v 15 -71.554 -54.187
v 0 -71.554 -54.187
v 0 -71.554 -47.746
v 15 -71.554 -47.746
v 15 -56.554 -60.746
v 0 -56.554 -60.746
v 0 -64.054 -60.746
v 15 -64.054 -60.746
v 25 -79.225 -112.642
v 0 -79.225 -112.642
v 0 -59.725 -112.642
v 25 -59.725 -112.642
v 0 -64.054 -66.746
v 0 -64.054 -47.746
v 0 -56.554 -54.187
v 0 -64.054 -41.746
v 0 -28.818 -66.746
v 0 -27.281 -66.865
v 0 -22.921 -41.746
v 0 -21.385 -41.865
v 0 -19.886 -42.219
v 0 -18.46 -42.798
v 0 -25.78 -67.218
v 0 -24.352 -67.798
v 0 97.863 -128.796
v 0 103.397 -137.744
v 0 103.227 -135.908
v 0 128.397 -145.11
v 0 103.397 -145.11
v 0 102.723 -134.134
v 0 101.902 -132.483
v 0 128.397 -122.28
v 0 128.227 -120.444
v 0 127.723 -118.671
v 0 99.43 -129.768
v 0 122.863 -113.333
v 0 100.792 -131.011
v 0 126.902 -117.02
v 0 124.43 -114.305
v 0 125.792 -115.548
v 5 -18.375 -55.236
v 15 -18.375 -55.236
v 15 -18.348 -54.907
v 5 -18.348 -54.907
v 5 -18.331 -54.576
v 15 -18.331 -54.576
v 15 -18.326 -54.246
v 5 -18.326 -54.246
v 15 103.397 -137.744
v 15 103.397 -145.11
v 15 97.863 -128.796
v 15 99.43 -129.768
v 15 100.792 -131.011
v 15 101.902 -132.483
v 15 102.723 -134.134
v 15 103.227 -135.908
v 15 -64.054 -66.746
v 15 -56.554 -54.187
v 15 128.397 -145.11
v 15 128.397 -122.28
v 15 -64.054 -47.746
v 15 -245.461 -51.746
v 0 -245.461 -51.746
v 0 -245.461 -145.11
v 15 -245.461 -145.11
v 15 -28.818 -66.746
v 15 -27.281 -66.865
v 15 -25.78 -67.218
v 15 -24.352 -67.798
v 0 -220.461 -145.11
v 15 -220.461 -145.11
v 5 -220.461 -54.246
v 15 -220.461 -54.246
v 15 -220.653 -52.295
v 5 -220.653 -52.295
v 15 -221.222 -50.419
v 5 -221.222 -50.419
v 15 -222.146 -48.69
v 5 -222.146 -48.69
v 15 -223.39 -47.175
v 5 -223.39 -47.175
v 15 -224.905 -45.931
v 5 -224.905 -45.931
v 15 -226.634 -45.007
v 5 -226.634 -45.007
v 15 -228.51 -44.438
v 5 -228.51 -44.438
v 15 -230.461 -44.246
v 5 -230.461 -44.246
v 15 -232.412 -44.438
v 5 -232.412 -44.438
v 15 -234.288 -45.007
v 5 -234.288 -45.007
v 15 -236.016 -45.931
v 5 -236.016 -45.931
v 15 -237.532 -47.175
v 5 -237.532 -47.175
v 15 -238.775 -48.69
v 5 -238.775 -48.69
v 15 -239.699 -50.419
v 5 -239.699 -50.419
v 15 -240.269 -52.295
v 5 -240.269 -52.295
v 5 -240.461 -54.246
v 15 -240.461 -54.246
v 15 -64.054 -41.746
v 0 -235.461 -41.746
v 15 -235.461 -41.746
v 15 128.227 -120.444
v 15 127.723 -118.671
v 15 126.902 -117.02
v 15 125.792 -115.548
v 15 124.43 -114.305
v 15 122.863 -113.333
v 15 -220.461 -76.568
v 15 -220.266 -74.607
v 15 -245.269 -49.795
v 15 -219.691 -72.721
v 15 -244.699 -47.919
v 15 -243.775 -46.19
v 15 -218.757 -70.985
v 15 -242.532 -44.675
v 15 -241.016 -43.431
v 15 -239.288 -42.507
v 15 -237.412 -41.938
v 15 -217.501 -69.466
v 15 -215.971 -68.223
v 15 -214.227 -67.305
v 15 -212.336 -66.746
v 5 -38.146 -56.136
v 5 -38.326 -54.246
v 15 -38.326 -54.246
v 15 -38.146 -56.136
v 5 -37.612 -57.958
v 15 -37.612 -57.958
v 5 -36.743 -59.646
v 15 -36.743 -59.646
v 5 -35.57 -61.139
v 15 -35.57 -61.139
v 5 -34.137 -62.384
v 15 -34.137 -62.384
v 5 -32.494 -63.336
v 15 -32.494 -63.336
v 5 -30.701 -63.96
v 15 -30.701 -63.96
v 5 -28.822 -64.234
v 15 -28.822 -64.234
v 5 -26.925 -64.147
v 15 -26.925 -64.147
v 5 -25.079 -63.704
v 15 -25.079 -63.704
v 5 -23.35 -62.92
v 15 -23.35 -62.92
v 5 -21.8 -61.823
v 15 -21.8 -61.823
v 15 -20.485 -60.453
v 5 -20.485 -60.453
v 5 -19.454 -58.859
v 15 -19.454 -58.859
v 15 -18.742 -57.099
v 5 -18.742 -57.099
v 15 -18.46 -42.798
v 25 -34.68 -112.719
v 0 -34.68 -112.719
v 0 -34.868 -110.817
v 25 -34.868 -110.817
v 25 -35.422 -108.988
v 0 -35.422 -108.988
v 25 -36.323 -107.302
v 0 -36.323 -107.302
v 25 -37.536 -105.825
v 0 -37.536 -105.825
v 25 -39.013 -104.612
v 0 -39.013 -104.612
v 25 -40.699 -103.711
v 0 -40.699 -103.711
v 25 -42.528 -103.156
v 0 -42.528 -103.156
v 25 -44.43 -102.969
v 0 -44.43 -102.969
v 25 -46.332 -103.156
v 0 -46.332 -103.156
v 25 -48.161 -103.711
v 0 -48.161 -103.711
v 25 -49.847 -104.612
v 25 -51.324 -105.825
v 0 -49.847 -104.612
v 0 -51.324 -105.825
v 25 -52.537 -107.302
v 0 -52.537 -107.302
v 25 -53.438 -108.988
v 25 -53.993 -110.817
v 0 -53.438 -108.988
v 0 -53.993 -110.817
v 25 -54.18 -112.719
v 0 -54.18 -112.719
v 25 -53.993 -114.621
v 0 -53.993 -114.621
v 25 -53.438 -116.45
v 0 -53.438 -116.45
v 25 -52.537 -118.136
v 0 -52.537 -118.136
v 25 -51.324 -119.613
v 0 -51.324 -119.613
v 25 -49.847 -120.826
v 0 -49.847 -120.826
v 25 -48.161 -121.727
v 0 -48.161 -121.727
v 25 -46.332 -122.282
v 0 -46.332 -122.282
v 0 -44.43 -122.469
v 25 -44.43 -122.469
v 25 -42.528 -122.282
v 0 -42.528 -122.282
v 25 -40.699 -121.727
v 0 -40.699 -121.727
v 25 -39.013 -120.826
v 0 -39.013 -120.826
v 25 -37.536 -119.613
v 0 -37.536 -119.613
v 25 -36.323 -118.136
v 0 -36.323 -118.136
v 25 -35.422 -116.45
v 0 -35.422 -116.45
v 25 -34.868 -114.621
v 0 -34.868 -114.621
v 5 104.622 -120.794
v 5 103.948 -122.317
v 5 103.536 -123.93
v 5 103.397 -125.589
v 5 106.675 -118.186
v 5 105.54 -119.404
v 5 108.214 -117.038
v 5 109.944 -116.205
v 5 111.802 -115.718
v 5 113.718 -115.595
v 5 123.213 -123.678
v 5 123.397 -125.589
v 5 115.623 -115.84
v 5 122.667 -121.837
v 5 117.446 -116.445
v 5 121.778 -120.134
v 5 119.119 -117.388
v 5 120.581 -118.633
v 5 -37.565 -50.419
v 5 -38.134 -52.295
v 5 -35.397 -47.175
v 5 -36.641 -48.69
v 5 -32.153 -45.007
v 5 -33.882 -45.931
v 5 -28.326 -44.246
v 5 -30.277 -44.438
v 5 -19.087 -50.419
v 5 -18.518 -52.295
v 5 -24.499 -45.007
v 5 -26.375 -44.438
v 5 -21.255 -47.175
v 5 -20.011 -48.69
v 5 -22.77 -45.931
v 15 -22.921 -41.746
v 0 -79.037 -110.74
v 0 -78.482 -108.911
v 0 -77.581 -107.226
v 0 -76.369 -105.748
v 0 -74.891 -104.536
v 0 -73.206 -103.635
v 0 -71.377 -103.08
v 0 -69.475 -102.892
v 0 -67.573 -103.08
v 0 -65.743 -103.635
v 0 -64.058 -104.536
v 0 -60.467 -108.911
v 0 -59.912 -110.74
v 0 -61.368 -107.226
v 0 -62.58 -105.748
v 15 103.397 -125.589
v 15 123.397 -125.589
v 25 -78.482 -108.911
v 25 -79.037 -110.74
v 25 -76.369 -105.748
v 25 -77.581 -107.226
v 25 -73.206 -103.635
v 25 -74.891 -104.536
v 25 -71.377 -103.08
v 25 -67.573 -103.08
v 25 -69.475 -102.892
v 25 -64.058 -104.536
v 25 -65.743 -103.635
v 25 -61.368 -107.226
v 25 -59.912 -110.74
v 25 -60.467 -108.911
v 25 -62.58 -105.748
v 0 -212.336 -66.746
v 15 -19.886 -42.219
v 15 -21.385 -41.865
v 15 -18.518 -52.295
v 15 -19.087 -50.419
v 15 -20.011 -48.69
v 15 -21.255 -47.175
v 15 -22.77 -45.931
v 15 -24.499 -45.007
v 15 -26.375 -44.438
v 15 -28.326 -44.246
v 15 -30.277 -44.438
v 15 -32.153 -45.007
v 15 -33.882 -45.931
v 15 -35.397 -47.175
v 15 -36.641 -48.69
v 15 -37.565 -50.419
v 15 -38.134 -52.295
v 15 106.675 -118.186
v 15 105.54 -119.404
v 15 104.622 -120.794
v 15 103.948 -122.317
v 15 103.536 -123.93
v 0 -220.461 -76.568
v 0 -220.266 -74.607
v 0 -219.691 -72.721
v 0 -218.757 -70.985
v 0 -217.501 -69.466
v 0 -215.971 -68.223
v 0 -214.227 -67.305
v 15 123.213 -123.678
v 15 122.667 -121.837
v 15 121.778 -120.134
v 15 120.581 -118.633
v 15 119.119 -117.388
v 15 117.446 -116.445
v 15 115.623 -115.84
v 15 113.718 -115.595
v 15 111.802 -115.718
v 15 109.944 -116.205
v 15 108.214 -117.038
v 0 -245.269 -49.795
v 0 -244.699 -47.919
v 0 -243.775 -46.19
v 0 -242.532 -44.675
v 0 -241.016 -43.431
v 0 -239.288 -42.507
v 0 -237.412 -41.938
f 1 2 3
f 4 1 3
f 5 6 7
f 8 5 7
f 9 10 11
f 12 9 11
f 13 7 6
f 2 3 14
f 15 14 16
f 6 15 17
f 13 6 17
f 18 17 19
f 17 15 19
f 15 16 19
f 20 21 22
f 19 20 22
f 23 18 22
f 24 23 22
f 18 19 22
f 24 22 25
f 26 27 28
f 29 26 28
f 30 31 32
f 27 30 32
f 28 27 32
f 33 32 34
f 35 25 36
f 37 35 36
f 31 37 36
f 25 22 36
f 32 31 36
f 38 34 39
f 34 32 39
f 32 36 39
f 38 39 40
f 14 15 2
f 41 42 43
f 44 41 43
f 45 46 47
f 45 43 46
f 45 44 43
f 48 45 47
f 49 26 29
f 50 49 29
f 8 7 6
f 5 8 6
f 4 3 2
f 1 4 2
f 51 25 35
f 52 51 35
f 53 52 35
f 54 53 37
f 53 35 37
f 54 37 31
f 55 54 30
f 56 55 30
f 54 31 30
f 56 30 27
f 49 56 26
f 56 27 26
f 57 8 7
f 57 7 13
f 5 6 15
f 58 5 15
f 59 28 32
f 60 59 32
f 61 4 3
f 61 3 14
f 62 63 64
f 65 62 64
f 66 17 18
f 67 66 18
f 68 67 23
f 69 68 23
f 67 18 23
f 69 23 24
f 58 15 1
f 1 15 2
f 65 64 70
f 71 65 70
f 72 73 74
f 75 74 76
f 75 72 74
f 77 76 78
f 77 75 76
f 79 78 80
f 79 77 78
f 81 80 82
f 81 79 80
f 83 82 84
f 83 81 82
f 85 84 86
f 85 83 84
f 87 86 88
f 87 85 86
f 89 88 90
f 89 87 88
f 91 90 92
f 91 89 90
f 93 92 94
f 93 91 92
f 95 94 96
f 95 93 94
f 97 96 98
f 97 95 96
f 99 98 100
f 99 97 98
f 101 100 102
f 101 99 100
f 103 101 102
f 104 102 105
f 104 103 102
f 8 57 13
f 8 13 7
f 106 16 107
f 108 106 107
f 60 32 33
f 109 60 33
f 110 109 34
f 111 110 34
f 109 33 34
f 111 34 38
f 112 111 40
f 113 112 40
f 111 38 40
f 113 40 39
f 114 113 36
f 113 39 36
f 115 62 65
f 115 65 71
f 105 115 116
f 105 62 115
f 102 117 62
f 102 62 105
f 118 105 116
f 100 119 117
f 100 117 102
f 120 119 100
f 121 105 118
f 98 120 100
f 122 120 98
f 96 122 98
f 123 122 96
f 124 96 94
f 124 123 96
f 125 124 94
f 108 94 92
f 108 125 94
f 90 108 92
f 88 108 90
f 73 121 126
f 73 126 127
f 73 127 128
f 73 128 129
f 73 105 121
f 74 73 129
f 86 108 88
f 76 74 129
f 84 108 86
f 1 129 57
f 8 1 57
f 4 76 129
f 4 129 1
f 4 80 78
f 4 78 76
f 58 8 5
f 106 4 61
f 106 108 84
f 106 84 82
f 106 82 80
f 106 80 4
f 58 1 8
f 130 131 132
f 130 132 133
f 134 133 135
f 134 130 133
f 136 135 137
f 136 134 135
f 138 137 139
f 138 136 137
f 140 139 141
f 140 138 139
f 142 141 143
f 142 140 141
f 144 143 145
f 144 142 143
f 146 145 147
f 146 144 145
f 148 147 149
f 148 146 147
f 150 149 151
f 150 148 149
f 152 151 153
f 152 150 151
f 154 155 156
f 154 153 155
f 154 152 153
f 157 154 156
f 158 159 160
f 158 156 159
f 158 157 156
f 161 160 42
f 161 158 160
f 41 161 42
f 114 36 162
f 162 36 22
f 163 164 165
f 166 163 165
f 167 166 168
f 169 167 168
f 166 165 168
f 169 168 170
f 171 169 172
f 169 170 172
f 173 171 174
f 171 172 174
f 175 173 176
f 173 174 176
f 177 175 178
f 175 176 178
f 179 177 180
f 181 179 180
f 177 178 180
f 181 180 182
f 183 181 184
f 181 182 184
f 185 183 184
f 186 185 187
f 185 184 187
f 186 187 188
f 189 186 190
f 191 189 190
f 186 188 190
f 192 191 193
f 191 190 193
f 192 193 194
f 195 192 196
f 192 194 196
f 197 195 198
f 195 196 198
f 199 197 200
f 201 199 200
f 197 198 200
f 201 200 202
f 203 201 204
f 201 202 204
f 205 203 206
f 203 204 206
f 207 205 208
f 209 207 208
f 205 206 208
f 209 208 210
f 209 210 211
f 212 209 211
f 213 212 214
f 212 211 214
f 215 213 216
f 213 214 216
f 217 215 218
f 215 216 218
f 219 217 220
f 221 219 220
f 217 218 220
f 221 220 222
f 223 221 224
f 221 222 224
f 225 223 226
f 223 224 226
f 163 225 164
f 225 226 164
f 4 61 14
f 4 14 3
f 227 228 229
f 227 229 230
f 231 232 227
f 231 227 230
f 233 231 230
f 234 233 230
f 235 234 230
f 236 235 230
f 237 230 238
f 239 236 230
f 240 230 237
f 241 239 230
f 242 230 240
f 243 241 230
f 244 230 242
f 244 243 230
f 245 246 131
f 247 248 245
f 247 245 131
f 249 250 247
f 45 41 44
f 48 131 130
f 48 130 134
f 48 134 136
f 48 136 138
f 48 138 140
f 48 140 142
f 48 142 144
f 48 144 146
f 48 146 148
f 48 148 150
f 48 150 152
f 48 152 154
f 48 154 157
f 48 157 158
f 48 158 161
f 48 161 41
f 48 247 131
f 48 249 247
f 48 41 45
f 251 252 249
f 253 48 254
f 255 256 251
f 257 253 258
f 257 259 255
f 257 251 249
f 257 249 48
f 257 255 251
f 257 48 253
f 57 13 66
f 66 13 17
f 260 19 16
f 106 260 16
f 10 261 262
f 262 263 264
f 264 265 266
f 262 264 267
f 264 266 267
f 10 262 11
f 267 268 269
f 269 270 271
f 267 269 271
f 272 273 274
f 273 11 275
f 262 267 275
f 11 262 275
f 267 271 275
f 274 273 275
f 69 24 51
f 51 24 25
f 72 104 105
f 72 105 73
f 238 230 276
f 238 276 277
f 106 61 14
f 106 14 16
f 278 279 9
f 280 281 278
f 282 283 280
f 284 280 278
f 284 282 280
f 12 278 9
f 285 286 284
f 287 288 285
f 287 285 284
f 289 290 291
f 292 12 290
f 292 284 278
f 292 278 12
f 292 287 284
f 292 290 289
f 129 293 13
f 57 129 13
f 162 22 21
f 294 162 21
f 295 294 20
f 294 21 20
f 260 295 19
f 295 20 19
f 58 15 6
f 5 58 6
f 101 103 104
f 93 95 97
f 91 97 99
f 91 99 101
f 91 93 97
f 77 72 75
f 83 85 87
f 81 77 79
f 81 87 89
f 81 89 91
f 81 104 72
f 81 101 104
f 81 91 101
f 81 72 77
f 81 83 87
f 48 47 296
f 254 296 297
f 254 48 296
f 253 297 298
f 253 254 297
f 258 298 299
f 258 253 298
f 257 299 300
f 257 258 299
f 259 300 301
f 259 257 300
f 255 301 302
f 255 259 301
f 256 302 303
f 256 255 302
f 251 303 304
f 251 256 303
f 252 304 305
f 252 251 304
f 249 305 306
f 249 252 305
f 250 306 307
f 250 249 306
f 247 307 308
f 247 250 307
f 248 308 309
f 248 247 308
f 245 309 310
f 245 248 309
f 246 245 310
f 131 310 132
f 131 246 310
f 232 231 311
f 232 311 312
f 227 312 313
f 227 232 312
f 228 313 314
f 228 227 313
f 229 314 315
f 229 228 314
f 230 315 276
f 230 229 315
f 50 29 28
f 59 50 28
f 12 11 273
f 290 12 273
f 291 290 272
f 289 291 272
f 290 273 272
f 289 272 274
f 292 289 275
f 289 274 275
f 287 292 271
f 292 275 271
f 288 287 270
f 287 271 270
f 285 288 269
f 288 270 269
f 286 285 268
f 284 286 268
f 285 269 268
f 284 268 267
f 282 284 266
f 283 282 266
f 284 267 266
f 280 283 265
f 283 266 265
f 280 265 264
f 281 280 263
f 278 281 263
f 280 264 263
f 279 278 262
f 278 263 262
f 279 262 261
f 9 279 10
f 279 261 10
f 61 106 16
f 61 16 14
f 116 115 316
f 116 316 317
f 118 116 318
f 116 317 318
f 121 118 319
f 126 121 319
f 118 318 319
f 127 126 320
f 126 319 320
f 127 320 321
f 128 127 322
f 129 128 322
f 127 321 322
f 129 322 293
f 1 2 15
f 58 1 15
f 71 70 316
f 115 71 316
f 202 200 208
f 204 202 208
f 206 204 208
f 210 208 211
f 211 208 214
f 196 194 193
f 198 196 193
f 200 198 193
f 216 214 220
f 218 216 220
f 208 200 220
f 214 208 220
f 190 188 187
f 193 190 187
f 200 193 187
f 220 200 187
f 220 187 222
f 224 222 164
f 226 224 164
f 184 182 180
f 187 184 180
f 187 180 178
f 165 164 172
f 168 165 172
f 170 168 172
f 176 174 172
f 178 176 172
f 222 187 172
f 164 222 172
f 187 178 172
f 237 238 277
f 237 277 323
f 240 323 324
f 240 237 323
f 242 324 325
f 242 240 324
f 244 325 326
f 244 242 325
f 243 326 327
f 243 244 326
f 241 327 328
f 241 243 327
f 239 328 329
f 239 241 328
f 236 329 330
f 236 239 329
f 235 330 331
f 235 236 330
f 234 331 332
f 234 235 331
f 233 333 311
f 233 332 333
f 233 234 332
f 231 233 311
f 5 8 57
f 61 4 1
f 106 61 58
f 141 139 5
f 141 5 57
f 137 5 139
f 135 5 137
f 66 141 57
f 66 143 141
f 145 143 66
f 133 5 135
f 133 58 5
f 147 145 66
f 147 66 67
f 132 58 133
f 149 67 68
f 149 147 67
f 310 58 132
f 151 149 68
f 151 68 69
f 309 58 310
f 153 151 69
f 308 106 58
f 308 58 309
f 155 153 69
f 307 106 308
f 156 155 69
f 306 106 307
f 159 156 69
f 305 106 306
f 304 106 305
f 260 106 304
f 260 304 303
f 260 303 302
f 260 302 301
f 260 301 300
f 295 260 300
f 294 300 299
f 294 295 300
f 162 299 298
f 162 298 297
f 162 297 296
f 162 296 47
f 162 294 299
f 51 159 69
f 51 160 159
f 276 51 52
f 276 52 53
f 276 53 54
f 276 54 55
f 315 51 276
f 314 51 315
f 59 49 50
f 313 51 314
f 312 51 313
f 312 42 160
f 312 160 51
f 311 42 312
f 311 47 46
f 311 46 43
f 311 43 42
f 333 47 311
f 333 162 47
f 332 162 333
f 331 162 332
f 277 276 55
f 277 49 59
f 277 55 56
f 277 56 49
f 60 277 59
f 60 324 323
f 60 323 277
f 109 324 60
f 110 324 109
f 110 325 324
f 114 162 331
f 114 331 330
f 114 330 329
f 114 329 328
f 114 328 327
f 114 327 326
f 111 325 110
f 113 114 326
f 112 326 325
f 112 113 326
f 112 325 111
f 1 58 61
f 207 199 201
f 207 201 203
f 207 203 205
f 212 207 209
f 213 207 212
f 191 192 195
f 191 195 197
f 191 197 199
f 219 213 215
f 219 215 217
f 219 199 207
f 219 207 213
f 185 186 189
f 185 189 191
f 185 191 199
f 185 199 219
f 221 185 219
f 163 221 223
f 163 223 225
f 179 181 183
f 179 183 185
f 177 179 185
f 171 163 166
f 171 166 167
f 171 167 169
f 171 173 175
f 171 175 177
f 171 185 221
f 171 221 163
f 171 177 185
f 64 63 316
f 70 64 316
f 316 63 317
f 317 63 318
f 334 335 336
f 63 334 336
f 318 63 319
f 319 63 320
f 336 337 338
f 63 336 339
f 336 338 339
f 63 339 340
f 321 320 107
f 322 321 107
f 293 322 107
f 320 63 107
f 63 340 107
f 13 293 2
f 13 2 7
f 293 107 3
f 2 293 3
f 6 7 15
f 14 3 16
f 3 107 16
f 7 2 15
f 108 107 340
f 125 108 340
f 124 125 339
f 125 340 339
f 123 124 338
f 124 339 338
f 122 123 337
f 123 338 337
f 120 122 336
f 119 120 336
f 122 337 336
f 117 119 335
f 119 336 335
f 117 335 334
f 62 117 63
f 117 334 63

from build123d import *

# Parameters (mm, degrees)
F3_DEPTH  = 15
F4_DEPTH  = 25
F5_DEPTH  = 15
F6_DEPTH  = 25
F7_DEPTH  = 25
F8_R      = 9.75
F9_DEPTH  = 25
F10_DEPTH = 5
F11_DEPTH = 5
F12_DEPTH = 5


with BuildPart() as f3:
    # F2 (on Right) → F3 (new body)
    with BuildSketch(Plane.YZ):
        with BuildLine():
            Line((-64.0537443757, -47.7458898533), (-64.0537443757, -41.7458898533))
            Line((-64.0537443757, -41.7458898533), (-235.4606981414, -41.7458898533))
            ThreePointArc((-235.4606981414, -41.7458898533), (-242.5317659533, -44.6748220415), (-245.4606981414, -51.7458898533))
            Line((-245.4606981414, -51.7458898533), (-245.4606981414, -145.1103440631))
            Line((-245.4606981414, -145.1103440631), (-220.4606981414, -145.1103440631))
            Line((-220.4606981414, -145.1103440631), (-220.4606981414, -76.5684022923))
            ThreePointArc((-220.4606981414, -76.5684022923), (-218.1664426563, -70.1949023534), (-212.336397847, -66.7458898533))
            Line((-212.336397847, -66.7458898533), (-64.0537443757, -66.7458898533))
            Line((-64.0537443757, -66.7458898533), (-64.0537443757, -60.7458898533))
            Line((-64.0537443757, -60.7458898533), (-56.5537443757, -60.7458898533))
            Line((-56.5537443757, -60.7458898533), (-56.5537443757, -54.18692423))
            Line((-56.5537443757, -54.18692423), (-71.5537443757, -54.18692423))
            Line((-71.5537443757, -54.18692423), (-71.5537443757, -47.7458898533))
            Line((-71.5537443757, -47.7458898533), (-64.0537443757, -47.7458898533))
        make_face()
    extrude(amount=F3_DEPTH)

    # F1 (on Right) → F4 (cut)
    with BuildSketch(Plane.YZ):
        with BuildLine():
            Line((-230.4606981414, -54.2458898533), (-220.4606981414, -54.2458898533))
            ThreePointArc((-220.4606981414, -54.2458898533), (-230.4606981414, -44.2458898533), (-240.4606981414, -54.2458898533))
            Line((-240.4606981414, -54.2458898533), (-230.4606981414, -54.2458898533))
        make_face()
    extrude(amount=F4_DEPTH, mode=Mode.SUBTRACT)

    # F1 (on Right) → F10 (join)
    with BuildSketch(Plane.YZ):
        with BuildLine():
            Line((-230.4606981414, -54.2458898533), (-220.4606981414, -54.2458898533))
            ThreePointArc((-220.4606981414, -54.2458898533), (-230.4606981414, -44.2458898533), (-240.4606981414, -54.2458898533))
            Line((-240.4606981414, -54.2458898533), (-230.4606981414, -54.2458898533))
        make_face()
    extrude(amount=F10_DEPTH)


with BuildPart() as f5:
    # F2 (on Right) → F5 (new body)
    with BuildSketch(Plane.YZ):
        with BuildLine():
            Line((103.3974266851, -145.1103440631), (128.3974266851, -145.1103440631))
            Line((128.3974266851, -145.1103440631), (128.3974266851, -122.2802950504))
            ThreePointArc((128.3974266851, -122.2802950504), (126.9020431462, -117.0199244505), (122.8631269154, -113.3328081712))
            Line((122.8631269154, -113.3328081712), (-18.4597660903, -42.7984017651))
            ThreePointArc((-18.4597660903, -42.7984017651), (-20.6290450089, -42.0131372779), (-22.9205489159, -41.7458898533))
            Line((-22.9205489159, -41.7458898533), (-64.0537443757, -41.7458898533))
            Line((-64.0537443757, -41.7458898533), (-64.0537443757, -47.7458898533))
            Line((-64.0537443757, -47.7458898533), (-71.5537443757, -47.7458898533))
            Line((-71.5537443757, -47.7458898533), (-71.5537443757, -54.18692423))
            Line((-71.5537443757, -54.18692423), (-56.5537443757, -54.18692423))
            Line((-56.5537443757, -54.18692423), (-56.5537443757, -60.7458898533))
            Line((-56.5537443757, -60.7458898533), (-64.0537443757, -60.7458898533))
            Line((-64.0537443757, -60.7458898533), (-64.0537443757, -66.7458898533))
            Line((-64.0537443757, -66.7458898533), (-28.8176704198, -66.7458898533))
            ThreePointArc((-28.8176704198, -66.7458898533), (-26.5236421715, -67.0125741595), (-24.3519701895, -67.7984029742))
            Line((-24.3519701895, -67.7984029742), (97.8631269154, -128.7960880966))
            ThreePointArc((97.8631269154, -128.7960880966), (101.9020431462, -132.4832043759), (103.3974266851, -137.7435749758))
            Line((103.3974266851, -137.7435749758), (103.3974266851, -145.1103440631))
        make_face()
    extrude(amount=F5_DEPTH)

    # F1 (on Right) → F6 (cut)
    with BuildSketch(Plane.YZ):
        with BuildLine():
            Line((-28.3260242226, -54.2458898533), (-18.3260242226, -54.2458898533))
            ThreePointArc((-18.3260242226, -54.2458898533), (-28.3260242226, -44.2458898533), (-38.3260242226, -54.2458898533))
            Line((-38.3260242226, -54.2458898533), (-28.3260242226, -54.2458898533))
        make_face()
    extrude(amount=F6_DEPTH, mode=Mode.SUBTRACT)

    # F1 (on Right) → F7 (cut)
    with BuildSketch(Plane.YZ):
        with BuildLine():
            ThreePointArc((123.3974266851, -125.5894405546), (117.4455848239, -116.4454580698), (106.6749435485, -118.1861831311))
            ThreePointArc((106.6749435485, -118.1861831311), (104.2534442002, -121.5412824158), (103.3974266851, -125.5894405546))
            Line((103.3974266851, -125.5894405546), (113.3974266851, -125.5894405546))
            Line((113.3974266851, -125.5894405546), (123.3974266851, -125.5894405546))
        make_face()
        with BuildLine():
            ThreePointArc((-18.3751599266, -55.2359907384), (-18.3383157026, -54.741549535), (-18.3260242226, -54.2458898533))
            Line((-18.3260242226, -54.2458898533), (-28.3260242226, -54.2458898533))
            Line((-28.3260242226, -54.2458898533), (-38.3260242226, -54.2458898533))
            ThreePointArc((-38.3260242226, -54.2458898533), (-28.8216839042, -64.2335983733), (-18.3751599266, -55.2359907384))
        make_face()
    extrude(amount=F7_DEPTH, mode=Mode.SUBTRACT)

    # F1 (on Right) → F11 (join)
    with BuildSketch(Plane.YZ):
        with BuildLine():
            Line((-28.3260242226, -54.2458898533), (-18.3260242226, -54.2458898533))
            ThreePointArc((-18.3260242226, -54.2458898533), (-28.3260242226, -44.2458898533), (-38.3260242226, -54.2458898533))
            Line((-38.3260242226, -54.2458898533), (-28.3260242226, -54.2458898533))
        make_face()
        with BuildLine():
            ThreePointArc((123.3974266851, -125.5894405546), (117.4455848239, -116.4454580698), (106.6749435485, -118.1861831311))
            ThreePointArc((106.6749435485, -118.1861831311), (104.2534442002, -121.5412824158), (103.3974266851, -125.5894405546))
            Line((103.3974266851, -125.5894405546), (113.3974266851, -125.5894405546))
            Line((113.3974266851, -125.5894405546), (123.3974266851, -125.5894405546))
        make_face()
    extrude(amount=F11_DEPTH)

    # F1 (on Right) → F12 (join)
    with BuildSketch(Plane.YZ):
        with BuildLine():
            ThreePointArc((-18.3751599266, -55.2359907384), (-18.3383157026, -54.741549535), (-18.3260242226, -54.2458898533))
            Line((-18.3260242226, -54.2458898533), (-28.3260242226, -54.2458898533))
            Line((-28.3260242226, -54.2458898533), (-38.3260242226, -54.2458898533))
            ThreePointArc((-38.3260242226, -54.2458898533), (-28.8216839042, -64.2335983733), (-18.3751599266, -55.2359907384))
        make_face()
    extrude(amount=F12_DEPTH)


with BuildPart() as f9:
    # F8 (on Right) → F9 (new body)
    with BuildSketch(Plane.YZ):
        with Locations((-44.4301724343, -112.7188607796)):
            Circle(F8_R)
    extrude(amount=F9_DEPTH)


with BuildPart() as f9b:
    # F8 (on Right) → F9, piece 2 (new body)
    with BuildSketch(Plane.YZ):
        with BuildLine():
            Line((-69.4746359646, -112.642429769), (-59.7246359646, -112.642429769))
            ThreePointArc((-59.7246359646, -112.642429769), (-69.4746359646, -102.892429769), (-79.2246359646, -112.642429769))
            Line((-79.2246359646, -112.642429769), (-69.4746359646, -112.642429769))
        make_face()
    extrude(amount=F9_DEPTH)


solid = Compound([f3.part, f5.part, f9.part, f9b.part])
